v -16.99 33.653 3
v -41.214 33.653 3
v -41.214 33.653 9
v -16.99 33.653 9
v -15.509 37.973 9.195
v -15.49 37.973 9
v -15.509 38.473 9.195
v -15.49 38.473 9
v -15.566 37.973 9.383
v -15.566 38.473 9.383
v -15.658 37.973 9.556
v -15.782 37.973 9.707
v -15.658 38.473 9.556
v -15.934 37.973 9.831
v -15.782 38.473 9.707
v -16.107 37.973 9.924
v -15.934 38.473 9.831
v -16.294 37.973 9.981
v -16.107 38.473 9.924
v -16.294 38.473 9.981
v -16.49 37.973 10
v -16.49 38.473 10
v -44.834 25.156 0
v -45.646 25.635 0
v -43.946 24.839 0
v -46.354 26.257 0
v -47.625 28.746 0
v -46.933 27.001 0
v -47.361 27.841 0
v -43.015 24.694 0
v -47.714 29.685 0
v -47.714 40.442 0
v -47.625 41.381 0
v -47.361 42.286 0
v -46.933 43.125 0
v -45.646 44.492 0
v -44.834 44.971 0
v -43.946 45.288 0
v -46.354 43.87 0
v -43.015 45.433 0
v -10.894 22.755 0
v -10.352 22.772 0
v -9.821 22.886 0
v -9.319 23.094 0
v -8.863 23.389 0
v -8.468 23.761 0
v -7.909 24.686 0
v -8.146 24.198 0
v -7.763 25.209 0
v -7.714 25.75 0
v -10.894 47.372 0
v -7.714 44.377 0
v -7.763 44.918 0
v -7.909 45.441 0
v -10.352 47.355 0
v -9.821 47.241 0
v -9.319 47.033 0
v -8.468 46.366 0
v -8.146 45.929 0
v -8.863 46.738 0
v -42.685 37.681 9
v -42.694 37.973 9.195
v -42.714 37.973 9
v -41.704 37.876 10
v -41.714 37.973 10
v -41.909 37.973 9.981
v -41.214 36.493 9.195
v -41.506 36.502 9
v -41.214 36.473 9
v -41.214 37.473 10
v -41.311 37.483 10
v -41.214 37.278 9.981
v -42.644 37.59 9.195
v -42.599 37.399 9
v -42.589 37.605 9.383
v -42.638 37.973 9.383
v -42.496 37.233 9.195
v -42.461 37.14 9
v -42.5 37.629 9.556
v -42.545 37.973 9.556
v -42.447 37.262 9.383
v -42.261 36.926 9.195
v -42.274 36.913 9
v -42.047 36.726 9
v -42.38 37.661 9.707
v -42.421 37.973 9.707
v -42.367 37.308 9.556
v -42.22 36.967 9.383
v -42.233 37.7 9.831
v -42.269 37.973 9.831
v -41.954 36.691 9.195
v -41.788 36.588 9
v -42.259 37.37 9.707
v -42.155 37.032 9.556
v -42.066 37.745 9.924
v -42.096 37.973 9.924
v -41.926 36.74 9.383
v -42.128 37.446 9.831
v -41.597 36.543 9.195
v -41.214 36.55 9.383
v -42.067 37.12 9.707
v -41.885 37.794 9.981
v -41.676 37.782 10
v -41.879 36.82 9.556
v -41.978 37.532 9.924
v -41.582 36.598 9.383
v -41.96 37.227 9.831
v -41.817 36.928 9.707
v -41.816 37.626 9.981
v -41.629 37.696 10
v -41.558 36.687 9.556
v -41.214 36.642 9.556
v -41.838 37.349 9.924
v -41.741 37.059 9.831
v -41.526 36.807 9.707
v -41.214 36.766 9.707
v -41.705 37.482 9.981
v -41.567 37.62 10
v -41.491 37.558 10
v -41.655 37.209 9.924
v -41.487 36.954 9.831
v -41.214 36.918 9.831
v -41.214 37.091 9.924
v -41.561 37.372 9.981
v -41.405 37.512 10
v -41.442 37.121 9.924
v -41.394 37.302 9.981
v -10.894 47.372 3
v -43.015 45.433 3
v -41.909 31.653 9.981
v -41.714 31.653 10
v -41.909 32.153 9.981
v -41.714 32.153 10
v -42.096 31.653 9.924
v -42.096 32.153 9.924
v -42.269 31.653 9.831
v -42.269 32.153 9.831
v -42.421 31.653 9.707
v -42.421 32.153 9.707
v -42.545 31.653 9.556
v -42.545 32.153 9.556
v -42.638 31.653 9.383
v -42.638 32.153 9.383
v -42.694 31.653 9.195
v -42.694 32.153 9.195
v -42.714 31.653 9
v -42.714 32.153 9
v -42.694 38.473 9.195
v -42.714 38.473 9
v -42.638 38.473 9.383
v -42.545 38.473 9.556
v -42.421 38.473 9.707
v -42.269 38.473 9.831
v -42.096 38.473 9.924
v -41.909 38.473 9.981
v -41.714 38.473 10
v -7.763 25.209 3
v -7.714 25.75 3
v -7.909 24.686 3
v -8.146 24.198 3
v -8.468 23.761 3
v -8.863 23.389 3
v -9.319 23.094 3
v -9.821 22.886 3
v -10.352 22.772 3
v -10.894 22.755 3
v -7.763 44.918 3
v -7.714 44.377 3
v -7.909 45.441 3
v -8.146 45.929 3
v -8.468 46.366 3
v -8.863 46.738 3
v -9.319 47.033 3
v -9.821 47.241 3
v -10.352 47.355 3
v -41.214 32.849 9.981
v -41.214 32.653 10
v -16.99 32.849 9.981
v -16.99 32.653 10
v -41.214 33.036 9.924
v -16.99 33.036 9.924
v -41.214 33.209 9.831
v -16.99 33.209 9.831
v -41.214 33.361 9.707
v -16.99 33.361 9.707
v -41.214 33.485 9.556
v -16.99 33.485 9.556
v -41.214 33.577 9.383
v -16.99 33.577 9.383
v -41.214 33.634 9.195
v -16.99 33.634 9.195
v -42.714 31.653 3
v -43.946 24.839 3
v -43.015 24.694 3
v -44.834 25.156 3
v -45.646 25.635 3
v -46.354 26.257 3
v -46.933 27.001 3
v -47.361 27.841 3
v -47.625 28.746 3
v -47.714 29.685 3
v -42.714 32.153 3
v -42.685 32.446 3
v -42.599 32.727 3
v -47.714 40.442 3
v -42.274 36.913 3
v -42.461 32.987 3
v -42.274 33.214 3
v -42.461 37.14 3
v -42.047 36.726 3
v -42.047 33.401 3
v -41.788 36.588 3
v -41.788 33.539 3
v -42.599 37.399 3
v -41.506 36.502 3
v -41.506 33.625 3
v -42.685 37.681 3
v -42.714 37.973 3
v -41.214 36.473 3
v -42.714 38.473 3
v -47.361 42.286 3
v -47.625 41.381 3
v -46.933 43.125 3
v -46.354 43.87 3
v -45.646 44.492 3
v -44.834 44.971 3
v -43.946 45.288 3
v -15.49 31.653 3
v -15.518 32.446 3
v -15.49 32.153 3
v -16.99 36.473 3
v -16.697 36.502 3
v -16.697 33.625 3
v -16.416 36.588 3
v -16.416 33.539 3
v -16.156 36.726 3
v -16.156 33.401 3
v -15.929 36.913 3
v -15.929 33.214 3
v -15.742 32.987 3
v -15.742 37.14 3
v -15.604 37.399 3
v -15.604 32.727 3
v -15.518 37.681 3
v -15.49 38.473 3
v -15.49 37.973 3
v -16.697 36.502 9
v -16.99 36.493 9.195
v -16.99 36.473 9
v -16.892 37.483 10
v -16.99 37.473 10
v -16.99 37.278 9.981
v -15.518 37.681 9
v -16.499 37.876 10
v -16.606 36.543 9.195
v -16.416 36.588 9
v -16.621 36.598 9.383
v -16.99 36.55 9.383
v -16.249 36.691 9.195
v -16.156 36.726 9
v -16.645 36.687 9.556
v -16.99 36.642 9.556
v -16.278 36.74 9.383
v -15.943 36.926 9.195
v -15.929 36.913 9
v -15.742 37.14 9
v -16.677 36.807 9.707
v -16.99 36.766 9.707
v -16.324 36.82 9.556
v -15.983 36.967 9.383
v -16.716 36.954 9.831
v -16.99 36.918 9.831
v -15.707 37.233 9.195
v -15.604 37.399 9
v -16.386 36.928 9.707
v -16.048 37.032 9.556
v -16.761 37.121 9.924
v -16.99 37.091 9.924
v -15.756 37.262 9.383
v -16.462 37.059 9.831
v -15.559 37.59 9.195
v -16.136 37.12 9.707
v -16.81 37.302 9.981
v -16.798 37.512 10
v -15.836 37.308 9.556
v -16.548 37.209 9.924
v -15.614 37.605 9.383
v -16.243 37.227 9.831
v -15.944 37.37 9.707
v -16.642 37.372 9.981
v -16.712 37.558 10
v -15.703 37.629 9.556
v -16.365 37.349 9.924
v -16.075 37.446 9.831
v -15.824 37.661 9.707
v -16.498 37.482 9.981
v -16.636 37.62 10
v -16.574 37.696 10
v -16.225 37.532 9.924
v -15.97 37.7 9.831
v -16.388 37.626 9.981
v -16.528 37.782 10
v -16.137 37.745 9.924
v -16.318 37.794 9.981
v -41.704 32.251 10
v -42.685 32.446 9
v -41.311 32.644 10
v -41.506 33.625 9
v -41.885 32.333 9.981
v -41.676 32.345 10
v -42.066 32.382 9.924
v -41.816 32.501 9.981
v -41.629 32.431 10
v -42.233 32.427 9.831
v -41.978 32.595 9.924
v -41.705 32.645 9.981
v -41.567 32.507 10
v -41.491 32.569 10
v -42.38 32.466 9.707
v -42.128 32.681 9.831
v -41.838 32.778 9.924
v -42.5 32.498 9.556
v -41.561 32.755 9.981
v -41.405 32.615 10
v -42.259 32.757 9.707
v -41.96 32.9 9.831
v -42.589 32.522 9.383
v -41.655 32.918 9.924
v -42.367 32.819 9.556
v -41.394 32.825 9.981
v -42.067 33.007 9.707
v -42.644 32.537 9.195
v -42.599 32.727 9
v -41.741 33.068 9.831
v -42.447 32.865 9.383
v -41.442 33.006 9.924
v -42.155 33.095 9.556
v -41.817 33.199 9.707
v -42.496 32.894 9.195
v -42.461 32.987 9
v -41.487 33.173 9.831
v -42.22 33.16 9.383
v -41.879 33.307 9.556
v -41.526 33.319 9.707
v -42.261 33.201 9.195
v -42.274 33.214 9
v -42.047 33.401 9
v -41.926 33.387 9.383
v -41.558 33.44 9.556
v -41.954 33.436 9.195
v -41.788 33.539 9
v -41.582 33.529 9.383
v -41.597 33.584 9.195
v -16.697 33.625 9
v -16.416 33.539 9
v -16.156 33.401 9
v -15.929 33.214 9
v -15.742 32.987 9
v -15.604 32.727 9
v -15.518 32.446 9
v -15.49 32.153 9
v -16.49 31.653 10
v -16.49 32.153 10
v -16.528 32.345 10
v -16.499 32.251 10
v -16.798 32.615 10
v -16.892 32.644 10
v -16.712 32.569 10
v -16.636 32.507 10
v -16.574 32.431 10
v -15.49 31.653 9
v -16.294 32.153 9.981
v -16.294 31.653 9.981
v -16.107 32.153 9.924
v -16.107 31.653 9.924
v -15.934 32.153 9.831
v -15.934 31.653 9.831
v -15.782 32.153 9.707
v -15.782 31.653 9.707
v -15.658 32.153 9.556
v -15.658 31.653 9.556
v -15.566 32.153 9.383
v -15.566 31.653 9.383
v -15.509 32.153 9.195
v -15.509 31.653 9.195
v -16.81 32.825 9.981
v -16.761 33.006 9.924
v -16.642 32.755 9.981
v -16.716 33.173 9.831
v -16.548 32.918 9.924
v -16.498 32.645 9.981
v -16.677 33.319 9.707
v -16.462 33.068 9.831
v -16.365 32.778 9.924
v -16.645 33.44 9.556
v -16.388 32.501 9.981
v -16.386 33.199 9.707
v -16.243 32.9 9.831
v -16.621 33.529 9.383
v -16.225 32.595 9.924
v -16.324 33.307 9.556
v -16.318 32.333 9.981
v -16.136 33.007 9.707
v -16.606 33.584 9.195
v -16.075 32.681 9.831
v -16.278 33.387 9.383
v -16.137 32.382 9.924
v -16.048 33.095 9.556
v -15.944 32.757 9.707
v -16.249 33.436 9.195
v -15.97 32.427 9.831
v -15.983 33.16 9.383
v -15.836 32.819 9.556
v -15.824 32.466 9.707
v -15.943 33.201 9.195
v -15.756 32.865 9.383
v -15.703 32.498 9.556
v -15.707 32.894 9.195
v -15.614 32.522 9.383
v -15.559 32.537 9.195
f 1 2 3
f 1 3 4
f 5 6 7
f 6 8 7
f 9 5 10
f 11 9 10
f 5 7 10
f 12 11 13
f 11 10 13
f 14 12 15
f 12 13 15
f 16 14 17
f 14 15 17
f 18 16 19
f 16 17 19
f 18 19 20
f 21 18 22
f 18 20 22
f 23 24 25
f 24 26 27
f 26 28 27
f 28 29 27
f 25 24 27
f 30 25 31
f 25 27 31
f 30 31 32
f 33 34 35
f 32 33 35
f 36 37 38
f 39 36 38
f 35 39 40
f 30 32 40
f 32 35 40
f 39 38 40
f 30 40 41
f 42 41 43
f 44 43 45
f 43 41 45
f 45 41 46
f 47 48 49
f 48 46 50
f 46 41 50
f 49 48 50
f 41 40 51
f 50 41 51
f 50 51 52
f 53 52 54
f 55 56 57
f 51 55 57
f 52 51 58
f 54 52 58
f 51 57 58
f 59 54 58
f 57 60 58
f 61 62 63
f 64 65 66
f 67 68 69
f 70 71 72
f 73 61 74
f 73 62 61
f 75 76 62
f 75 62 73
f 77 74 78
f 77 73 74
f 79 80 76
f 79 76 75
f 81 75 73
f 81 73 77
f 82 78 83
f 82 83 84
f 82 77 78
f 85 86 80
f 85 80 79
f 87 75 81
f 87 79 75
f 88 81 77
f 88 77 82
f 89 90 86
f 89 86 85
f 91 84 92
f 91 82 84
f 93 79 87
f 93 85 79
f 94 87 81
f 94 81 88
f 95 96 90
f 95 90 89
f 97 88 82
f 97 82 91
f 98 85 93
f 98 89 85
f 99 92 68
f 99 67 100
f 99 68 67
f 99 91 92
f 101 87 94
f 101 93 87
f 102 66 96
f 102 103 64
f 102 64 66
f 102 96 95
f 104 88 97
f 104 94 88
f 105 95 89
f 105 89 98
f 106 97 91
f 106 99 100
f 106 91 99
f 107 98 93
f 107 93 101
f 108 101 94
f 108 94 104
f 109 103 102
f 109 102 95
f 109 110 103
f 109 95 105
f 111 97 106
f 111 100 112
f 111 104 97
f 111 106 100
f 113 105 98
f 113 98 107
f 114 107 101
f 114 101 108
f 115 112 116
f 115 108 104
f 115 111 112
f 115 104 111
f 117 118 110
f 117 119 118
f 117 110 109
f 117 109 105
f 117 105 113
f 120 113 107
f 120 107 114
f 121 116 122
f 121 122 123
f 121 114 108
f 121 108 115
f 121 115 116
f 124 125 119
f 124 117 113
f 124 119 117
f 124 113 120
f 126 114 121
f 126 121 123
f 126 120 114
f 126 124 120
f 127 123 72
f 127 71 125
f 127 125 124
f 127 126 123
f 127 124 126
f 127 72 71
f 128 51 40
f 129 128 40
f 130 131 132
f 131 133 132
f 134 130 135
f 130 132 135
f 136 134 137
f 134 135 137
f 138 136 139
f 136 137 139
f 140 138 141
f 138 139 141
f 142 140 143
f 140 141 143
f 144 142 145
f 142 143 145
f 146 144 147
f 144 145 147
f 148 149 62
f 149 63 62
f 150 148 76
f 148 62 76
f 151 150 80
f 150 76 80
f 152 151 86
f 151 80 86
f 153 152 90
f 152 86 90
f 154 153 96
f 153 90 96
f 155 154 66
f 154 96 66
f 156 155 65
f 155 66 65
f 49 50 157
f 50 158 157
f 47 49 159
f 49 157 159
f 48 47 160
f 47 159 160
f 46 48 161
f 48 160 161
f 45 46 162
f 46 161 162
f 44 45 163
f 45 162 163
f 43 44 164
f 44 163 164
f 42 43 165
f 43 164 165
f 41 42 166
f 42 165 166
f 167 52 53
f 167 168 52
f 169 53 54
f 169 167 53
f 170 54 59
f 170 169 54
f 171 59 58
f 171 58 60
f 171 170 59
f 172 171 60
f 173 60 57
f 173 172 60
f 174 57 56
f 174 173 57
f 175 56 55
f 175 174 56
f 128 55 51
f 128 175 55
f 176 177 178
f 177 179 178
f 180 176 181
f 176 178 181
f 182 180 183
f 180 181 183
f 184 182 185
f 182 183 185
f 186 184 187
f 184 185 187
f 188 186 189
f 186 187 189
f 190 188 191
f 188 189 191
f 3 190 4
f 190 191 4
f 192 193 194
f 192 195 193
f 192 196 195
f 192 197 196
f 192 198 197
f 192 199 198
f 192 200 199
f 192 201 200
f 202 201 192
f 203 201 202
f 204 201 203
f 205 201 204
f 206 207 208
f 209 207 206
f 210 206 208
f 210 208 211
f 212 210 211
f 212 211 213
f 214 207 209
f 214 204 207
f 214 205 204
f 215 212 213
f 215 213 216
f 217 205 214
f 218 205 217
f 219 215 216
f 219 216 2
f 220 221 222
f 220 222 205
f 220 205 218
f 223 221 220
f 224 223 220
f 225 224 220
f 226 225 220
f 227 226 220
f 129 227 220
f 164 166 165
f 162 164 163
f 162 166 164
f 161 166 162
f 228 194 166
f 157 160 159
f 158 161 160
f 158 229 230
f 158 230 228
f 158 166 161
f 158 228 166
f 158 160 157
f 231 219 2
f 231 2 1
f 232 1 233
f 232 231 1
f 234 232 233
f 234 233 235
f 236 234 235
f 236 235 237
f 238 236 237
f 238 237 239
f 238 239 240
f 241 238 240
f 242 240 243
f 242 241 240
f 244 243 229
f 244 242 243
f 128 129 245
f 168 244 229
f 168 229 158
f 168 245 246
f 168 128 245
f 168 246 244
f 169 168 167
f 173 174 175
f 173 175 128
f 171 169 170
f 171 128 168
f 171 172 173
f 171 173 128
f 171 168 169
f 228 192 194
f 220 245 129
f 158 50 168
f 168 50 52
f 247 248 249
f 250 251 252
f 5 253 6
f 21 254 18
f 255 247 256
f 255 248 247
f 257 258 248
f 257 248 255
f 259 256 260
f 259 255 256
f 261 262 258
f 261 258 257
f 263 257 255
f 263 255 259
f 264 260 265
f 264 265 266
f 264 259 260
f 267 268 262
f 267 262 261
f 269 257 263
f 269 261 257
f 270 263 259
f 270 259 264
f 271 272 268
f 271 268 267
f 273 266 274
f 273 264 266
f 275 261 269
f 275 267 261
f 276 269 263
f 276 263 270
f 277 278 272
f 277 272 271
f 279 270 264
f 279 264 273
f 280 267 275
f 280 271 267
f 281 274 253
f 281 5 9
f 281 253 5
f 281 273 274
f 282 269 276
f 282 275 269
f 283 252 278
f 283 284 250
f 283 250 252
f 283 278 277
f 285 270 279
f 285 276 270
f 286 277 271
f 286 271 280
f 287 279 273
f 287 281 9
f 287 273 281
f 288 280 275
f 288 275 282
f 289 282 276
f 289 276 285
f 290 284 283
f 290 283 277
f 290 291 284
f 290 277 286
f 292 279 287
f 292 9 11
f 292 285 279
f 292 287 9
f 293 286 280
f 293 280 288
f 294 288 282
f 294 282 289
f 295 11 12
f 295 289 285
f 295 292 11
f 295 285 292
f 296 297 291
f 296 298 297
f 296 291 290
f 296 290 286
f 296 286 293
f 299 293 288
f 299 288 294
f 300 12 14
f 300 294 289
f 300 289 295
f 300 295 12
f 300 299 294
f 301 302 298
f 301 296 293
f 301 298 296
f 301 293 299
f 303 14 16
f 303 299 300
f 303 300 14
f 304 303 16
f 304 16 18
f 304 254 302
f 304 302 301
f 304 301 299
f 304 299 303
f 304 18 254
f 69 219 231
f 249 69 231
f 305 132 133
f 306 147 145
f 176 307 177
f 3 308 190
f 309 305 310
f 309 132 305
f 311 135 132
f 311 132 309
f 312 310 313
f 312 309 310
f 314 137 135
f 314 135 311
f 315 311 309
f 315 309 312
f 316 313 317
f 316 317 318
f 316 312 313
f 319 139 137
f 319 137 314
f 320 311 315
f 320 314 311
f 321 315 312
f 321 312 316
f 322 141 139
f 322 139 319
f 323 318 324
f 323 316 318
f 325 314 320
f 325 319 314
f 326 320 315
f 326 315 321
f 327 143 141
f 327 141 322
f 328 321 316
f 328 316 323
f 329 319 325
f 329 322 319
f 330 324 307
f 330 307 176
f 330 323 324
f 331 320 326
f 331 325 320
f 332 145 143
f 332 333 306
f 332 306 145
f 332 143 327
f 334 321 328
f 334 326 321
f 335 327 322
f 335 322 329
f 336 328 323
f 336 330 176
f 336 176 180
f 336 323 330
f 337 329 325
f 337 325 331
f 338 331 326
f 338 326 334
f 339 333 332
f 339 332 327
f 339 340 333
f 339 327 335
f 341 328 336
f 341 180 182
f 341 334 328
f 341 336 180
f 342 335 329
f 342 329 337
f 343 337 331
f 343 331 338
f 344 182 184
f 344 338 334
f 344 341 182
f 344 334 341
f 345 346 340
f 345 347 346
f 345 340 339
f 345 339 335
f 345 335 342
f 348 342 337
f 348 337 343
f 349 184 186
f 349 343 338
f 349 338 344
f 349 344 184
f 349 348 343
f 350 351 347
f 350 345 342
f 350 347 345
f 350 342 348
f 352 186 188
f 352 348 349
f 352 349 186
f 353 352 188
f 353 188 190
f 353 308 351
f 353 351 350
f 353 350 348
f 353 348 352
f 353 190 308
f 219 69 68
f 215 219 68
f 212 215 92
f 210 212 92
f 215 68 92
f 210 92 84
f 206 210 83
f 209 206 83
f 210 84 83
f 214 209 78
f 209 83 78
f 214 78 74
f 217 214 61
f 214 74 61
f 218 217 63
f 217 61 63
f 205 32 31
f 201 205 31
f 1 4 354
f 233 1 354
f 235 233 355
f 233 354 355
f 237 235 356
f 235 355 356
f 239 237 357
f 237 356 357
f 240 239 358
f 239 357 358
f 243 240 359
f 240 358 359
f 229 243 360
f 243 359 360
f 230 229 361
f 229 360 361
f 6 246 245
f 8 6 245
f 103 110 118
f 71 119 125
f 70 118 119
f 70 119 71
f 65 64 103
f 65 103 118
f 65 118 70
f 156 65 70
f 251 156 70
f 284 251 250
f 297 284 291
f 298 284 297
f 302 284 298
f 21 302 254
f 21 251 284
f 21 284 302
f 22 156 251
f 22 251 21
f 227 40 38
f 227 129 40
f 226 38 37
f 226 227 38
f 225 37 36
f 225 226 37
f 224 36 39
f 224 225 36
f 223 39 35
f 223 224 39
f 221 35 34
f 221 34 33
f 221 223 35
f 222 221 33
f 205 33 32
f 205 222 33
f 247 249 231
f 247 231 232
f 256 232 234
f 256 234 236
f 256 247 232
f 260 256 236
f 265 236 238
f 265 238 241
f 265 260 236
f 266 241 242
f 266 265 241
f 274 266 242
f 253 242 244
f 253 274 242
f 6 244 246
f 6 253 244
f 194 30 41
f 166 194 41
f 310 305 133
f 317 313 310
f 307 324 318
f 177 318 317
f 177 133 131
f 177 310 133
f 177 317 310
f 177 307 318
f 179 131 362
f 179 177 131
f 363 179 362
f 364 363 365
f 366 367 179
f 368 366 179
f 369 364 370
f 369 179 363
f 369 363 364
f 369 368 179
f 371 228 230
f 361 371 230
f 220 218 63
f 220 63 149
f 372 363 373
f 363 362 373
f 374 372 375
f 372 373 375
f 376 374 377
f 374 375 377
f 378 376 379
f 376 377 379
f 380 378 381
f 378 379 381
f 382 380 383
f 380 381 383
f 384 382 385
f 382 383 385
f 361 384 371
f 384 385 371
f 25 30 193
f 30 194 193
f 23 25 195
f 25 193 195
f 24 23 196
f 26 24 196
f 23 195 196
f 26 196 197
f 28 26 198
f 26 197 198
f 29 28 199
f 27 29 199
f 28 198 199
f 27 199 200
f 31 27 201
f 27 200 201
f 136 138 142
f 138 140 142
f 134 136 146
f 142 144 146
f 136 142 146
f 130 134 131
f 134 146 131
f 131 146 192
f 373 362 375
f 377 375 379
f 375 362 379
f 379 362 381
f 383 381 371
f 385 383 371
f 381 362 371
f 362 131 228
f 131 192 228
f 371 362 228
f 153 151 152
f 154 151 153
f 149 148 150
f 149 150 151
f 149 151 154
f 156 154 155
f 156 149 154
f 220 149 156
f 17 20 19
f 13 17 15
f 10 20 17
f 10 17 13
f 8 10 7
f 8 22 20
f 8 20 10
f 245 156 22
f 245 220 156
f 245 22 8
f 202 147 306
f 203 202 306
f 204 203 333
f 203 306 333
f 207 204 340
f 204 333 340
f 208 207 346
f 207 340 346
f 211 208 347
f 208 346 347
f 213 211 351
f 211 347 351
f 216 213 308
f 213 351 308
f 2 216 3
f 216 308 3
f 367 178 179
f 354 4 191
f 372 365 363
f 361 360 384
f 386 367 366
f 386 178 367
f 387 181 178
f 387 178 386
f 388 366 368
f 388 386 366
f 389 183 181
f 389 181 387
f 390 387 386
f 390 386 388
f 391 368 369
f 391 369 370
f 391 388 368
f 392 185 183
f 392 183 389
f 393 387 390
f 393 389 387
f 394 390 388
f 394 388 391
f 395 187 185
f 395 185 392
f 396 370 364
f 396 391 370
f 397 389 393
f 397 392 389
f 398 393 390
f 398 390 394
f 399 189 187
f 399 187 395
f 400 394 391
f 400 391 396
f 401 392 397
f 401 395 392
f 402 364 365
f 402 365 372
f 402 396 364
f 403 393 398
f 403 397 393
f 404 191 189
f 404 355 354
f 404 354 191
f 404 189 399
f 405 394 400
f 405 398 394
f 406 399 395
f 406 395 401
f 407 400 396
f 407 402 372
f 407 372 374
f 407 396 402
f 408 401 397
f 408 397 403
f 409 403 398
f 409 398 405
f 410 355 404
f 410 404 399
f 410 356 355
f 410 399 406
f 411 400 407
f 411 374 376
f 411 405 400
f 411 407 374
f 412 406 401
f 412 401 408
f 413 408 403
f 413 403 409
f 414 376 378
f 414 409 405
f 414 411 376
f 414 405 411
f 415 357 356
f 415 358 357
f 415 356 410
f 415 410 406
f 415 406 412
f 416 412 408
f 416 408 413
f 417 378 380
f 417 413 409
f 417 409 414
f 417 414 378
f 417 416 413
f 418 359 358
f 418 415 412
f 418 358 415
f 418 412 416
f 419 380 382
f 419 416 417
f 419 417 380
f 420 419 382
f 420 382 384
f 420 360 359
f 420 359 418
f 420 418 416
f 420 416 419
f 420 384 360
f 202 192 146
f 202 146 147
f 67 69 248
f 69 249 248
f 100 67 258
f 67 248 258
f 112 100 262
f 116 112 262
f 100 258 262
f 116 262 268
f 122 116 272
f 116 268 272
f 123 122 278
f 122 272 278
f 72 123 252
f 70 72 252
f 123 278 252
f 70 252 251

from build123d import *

# Parameters (mm, degrees)
F0_W     = 27.2240719226
F0_H     = 2
F1_DEPTH = 3
F2_DEPTH = 10
F3_R     = 1.5
F4_R     = 1
F5_R     = 3
F6_R     = 5


with BuildPart() as f1:
    # F0 (on Top) → F1 (new body)
    with BuildSketch(Plane.XY):
        Polygon((-7.7136544558, 22.5634722376), (-7.7136544558, 47.5634722376), (-47.7136544558, 45.1496791341), (-47.7136544558, 24.977265341), align=None)
        with Locations((-29.1016184945, 32.6534722376)):
            Rectangle(F0_W, F0_H, mode=Mode.SUBTRACT)
        with Locations((-29.1016184945, 37.4734722376)):
            Rectangle(F0_W, F0_H, mode=Mode.SUBTRACT)
    extrude(amount=F1_DEPTH)

    # F0 (on Top) → F2 (join)
    with BuildSketch(Plane.XY):
        with Locations((-29.1016184945, 32.6534722376)):
            Rectangle(F0_W, F0_H)
        with Locations((-29.1016184945, 37.4734722376)):
            Rectangle(F0_W, F0_H)
    extrude(amount=F2_DEPTH)

    # F3
    f3_edges = [f1.edges().sort_by_distance(p)[0] for p in [
        (-42.713654, 36.473472, 6.5),
        (-42.713654, 33.653472, 6.5),
        (-15.489583, 36.473472, 6.5),
        (-15.489583, 33.653472, 6.5),
    ]]
    fillet(f3_edges, radius=F3_R)

    # F4
    f4_edges = [f1.edges().sort_by_distance(p)[0] for p in [
        (-29.101618, 36.473472, 10),
        (-29.101618, 33.653472, 10),
        (-42.713654, 31.903472, 10),
        (-42.274315, 33.214132, 10),
        (-15.489583, 31.903472, 10),
        (-15.928922, 33.214132, 10),
        (-15.928922, 36.912812, 10),
        (-42.274315, 36.912812, 10),
        (-15.489583, 38.223472, 10),
        (-42.713654, 38.223472, 10),
    ]]
    fillet(f4_edges, radius=F4_R)

    # F5
    f5_edges = [f1.edges().sort_by_distance(p)[0] for p in [
        (-7.713654, 22.563472, 1.5),
        (-7.713654, 47.563472, 1.5),
    ]]
    fillet(f5_edges, radius=F5_R)

    # F6
    f6_edges = [f1.edges().sort_by_distance(p)[0] for p in [
        (-47.713654, 45.149679, 1.5),
        (-47.713654, 24.977265, 1.5),
    ]]
    fillet(f6_edges, radius=F6_R)


solid = f1.part
